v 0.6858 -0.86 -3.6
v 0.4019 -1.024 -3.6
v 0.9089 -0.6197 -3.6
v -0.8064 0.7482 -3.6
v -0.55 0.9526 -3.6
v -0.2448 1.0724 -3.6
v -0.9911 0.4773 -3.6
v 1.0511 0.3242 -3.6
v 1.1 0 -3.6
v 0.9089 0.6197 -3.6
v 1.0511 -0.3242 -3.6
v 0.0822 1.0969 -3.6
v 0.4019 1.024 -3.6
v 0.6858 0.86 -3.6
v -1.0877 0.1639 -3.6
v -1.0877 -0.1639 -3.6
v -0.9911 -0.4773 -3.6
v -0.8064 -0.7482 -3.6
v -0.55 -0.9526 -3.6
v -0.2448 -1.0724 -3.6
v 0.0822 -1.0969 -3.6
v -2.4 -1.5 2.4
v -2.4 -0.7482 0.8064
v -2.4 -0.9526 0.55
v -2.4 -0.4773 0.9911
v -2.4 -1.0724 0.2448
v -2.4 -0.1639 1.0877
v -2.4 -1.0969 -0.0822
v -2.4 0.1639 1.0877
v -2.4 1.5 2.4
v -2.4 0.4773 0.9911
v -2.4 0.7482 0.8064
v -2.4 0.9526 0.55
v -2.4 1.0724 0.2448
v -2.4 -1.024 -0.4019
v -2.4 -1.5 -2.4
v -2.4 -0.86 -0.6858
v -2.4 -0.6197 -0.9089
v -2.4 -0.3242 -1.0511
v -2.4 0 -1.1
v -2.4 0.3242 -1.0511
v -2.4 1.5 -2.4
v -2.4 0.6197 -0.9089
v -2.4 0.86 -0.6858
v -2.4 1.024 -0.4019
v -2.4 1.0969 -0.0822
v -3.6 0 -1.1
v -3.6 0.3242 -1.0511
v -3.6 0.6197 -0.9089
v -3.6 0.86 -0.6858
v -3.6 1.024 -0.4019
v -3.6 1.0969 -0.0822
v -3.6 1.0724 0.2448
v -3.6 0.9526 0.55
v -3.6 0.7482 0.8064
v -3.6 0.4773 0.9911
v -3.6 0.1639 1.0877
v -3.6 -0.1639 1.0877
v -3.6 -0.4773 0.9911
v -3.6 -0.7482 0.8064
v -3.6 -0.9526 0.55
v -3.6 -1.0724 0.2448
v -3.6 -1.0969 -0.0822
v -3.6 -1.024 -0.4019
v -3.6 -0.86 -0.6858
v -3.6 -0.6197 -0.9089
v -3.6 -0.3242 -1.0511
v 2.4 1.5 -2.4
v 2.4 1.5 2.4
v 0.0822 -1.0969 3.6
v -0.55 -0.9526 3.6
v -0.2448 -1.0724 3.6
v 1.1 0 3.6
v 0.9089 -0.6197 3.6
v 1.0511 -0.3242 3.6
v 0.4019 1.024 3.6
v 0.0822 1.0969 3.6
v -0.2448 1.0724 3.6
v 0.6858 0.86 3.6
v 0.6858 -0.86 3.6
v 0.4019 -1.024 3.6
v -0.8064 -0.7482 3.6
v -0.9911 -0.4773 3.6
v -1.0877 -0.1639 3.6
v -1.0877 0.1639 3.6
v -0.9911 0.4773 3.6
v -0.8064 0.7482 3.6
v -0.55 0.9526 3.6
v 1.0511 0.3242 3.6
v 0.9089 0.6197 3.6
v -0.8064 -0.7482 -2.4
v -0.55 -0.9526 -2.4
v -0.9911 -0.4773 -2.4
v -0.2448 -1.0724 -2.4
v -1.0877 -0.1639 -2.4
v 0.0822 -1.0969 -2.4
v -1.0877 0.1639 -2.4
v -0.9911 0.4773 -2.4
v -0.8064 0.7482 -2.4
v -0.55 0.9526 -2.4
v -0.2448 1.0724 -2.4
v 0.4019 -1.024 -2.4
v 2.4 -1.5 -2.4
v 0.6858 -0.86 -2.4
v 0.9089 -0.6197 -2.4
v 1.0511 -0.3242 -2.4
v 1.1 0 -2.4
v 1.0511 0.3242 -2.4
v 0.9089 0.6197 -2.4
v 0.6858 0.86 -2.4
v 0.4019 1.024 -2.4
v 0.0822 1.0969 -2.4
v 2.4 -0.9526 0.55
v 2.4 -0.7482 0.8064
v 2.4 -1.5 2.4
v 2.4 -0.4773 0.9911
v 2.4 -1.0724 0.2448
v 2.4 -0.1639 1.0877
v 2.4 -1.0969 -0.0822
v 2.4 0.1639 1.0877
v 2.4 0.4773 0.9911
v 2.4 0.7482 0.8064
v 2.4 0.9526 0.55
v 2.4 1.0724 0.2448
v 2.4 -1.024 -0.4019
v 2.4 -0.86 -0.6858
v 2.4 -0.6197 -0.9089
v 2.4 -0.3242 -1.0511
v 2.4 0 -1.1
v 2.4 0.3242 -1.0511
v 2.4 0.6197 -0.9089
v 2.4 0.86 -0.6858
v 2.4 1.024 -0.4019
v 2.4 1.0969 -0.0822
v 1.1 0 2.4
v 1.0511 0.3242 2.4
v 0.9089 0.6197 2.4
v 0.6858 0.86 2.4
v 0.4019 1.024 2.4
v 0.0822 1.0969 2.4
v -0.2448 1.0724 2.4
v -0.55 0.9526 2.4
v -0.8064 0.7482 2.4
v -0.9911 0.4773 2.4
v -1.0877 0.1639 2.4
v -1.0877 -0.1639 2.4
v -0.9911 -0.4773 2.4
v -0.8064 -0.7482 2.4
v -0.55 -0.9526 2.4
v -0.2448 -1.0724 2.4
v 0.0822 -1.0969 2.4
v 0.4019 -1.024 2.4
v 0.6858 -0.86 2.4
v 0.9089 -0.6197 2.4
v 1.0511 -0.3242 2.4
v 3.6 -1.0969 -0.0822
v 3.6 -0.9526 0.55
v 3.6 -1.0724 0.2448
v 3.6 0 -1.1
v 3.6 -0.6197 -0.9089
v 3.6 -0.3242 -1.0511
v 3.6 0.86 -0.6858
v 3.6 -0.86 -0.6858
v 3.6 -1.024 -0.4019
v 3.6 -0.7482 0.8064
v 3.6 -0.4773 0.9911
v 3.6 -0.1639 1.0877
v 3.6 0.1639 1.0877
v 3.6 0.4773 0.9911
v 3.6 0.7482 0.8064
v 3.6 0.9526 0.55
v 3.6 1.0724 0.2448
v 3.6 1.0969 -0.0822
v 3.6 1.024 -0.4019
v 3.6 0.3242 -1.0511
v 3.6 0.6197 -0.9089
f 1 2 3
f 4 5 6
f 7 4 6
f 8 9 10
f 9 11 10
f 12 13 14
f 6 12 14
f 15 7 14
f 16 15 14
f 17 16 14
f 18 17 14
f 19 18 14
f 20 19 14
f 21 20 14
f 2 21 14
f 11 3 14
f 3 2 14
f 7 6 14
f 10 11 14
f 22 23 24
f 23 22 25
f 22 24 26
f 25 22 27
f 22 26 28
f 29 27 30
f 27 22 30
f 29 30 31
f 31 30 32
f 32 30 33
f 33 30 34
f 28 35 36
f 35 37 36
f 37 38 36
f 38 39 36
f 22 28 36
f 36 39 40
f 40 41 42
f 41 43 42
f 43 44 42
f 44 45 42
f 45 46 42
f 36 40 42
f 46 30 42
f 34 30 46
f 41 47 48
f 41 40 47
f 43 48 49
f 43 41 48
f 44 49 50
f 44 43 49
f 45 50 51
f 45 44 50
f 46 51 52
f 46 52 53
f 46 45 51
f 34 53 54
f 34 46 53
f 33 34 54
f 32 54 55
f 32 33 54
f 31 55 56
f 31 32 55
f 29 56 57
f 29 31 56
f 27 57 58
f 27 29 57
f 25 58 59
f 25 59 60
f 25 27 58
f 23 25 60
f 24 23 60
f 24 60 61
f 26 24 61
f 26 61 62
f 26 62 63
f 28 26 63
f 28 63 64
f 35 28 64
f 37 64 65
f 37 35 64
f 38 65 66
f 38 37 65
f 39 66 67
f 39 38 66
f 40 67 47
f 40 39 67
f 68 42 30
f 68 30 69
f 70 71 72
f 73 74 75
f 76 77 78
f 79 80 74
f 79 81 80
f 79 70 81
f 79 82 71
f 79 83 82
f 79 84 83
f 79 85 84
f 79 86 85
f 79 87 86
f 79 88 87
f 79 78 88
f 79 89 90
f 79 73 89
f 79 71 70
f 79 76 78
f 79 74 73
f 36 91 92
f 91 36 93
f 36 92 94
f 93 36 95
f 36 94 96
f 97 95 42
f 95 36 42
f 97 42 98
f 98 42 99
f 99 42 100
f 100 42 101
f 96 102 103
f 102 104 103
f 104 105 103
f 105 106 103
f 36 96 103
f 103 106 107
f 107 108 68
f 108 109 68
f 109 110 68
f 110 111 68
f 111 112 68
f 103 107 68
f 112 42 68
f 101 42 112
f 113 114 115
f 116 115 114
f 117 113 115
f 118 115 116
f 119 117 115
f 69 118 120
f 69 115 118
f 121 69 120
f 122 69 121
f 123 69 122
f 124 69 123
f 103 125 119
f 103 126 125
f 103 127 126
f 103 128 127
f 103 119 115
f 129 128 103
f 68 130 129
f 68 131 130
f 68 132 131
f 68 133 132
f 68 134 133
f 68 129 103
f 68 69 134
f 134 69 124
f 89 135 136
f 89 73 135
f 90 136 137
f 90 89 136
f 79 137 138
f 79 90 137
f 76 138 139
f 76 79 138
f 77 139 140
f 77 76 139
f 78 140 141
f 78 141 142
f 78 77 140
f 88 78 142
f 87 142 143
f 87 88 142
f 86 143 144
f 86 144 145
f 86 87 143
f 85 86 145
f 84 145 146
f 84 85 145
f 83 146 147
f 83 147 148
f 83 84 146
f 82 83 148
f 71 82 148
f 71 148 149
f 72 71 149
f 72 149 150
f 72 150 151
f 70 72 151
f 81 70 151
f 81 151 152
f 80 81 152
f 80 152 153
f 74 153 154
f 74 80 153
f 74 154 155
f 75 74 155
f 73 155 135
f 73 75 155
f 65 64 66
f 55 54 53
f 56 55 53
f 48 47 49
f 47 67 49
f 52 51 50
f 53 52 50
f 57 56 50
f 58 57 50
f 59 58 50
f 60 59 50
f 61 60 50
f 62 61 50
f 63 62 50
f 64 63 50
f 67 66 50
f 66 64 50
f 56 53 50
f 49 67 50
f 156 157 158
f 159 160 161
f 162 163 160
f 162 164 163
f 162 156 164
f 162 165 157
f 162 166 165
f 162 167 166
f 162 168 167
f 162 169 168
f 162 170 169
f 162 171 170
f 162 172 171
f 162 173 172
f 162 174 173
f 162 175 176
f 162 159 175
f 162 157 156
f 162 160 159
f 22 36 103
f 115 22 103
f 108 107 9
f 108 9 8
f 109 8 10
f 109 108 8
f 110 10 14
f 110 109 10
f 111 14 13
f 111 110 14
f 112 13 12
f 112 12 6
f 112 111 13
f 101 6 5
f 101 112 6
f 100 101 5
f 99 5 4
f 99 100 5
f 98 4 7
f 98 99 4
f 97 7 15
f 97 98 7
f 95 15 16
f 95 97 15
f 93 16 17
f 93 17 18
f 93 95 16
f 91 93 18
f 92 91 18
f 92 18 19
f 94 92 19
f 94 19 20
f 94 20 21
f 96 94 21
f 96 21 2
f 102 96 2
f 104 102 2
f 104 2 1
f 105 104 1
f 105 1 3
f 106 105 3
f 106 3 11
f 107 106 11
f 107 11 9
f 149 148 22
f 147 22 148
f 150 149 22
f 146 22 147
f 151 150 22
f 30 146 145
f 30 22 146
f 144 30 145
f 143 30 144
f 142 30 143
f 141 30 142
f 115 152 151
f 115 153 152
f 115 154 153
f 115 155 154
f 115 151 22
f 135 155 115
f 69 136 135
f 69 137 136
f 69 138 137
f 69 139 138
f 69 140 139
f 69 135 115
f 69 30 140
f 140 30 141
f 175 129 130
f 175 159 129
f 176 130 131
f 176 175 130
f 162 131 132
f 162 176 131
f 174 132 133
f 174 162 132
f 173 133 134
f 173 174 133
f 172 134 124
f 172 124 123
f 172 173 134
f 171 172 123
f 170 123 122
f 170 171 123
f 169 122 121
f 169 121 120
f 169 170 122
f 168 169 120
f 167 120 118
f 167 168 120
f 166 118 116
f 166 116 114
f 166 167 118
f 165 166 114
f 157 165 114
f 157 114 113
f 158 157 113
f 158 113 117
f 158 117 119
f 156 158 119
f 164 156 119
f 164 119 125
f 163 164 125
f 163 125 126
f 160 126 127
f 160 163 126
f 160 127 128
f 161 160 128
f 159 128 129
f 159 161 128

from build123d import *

# Parameters (mm, degrees)
SKETCH1_R           = 1.1
BOSS_EXTRUDE1_DEPTH = 3.6
CIRPATTERN1_COUNT   = 4
SKETCH3_W           = 4.8
SKETCH3_H           = 4.8
SKETCH3_W_2         = 2.2
SKETCH3_H_2         = 2.2
BOSS_EXTRUDE2_DEPTH = 1.5


with BuildPart() as part:
    # Sketch1 → Boss-Extrude1 (new, symmetric)
    with BuildSketch(Plane.XY):
        Circle(SKETCH1_R)
    boss_extrude1 = extrude(amount=BOSS_EXTRUDE1_DEPTH, both=True)

    # CirPattern1: Boss-Extrude1 ×4 about axis
    cirpattern1_axis = Axis((0, -1.485, 0), (0, 1, 0))
    for i in range(1, CIRPATTERN1_COUNT):
        add(boss_extrude1.rotate(cirpattern1_axis, i * 360 / CIRPATTERN1_COUNT))

    # Sketch3 → Boss-Extrude2 (add, symmetric)
    with BuildSketch(Plane(origin=(0, 0, 0), x_dir=(1, 0, 0), z_dir=(0, 1, 0))):
        Rectangle(SKETCH3_W, SKETCH3_H)
        Rectangle(SKETCH3_W_2, SKETCH3_H_2, mode=Mode.SUBTRACT)
        Rectangle(SKETCH3_W_2, SKETCH3_H_2)
    extrude(amount=BOSS_EXTRUDE2_DEPTH, both=True)


solid = part.part
